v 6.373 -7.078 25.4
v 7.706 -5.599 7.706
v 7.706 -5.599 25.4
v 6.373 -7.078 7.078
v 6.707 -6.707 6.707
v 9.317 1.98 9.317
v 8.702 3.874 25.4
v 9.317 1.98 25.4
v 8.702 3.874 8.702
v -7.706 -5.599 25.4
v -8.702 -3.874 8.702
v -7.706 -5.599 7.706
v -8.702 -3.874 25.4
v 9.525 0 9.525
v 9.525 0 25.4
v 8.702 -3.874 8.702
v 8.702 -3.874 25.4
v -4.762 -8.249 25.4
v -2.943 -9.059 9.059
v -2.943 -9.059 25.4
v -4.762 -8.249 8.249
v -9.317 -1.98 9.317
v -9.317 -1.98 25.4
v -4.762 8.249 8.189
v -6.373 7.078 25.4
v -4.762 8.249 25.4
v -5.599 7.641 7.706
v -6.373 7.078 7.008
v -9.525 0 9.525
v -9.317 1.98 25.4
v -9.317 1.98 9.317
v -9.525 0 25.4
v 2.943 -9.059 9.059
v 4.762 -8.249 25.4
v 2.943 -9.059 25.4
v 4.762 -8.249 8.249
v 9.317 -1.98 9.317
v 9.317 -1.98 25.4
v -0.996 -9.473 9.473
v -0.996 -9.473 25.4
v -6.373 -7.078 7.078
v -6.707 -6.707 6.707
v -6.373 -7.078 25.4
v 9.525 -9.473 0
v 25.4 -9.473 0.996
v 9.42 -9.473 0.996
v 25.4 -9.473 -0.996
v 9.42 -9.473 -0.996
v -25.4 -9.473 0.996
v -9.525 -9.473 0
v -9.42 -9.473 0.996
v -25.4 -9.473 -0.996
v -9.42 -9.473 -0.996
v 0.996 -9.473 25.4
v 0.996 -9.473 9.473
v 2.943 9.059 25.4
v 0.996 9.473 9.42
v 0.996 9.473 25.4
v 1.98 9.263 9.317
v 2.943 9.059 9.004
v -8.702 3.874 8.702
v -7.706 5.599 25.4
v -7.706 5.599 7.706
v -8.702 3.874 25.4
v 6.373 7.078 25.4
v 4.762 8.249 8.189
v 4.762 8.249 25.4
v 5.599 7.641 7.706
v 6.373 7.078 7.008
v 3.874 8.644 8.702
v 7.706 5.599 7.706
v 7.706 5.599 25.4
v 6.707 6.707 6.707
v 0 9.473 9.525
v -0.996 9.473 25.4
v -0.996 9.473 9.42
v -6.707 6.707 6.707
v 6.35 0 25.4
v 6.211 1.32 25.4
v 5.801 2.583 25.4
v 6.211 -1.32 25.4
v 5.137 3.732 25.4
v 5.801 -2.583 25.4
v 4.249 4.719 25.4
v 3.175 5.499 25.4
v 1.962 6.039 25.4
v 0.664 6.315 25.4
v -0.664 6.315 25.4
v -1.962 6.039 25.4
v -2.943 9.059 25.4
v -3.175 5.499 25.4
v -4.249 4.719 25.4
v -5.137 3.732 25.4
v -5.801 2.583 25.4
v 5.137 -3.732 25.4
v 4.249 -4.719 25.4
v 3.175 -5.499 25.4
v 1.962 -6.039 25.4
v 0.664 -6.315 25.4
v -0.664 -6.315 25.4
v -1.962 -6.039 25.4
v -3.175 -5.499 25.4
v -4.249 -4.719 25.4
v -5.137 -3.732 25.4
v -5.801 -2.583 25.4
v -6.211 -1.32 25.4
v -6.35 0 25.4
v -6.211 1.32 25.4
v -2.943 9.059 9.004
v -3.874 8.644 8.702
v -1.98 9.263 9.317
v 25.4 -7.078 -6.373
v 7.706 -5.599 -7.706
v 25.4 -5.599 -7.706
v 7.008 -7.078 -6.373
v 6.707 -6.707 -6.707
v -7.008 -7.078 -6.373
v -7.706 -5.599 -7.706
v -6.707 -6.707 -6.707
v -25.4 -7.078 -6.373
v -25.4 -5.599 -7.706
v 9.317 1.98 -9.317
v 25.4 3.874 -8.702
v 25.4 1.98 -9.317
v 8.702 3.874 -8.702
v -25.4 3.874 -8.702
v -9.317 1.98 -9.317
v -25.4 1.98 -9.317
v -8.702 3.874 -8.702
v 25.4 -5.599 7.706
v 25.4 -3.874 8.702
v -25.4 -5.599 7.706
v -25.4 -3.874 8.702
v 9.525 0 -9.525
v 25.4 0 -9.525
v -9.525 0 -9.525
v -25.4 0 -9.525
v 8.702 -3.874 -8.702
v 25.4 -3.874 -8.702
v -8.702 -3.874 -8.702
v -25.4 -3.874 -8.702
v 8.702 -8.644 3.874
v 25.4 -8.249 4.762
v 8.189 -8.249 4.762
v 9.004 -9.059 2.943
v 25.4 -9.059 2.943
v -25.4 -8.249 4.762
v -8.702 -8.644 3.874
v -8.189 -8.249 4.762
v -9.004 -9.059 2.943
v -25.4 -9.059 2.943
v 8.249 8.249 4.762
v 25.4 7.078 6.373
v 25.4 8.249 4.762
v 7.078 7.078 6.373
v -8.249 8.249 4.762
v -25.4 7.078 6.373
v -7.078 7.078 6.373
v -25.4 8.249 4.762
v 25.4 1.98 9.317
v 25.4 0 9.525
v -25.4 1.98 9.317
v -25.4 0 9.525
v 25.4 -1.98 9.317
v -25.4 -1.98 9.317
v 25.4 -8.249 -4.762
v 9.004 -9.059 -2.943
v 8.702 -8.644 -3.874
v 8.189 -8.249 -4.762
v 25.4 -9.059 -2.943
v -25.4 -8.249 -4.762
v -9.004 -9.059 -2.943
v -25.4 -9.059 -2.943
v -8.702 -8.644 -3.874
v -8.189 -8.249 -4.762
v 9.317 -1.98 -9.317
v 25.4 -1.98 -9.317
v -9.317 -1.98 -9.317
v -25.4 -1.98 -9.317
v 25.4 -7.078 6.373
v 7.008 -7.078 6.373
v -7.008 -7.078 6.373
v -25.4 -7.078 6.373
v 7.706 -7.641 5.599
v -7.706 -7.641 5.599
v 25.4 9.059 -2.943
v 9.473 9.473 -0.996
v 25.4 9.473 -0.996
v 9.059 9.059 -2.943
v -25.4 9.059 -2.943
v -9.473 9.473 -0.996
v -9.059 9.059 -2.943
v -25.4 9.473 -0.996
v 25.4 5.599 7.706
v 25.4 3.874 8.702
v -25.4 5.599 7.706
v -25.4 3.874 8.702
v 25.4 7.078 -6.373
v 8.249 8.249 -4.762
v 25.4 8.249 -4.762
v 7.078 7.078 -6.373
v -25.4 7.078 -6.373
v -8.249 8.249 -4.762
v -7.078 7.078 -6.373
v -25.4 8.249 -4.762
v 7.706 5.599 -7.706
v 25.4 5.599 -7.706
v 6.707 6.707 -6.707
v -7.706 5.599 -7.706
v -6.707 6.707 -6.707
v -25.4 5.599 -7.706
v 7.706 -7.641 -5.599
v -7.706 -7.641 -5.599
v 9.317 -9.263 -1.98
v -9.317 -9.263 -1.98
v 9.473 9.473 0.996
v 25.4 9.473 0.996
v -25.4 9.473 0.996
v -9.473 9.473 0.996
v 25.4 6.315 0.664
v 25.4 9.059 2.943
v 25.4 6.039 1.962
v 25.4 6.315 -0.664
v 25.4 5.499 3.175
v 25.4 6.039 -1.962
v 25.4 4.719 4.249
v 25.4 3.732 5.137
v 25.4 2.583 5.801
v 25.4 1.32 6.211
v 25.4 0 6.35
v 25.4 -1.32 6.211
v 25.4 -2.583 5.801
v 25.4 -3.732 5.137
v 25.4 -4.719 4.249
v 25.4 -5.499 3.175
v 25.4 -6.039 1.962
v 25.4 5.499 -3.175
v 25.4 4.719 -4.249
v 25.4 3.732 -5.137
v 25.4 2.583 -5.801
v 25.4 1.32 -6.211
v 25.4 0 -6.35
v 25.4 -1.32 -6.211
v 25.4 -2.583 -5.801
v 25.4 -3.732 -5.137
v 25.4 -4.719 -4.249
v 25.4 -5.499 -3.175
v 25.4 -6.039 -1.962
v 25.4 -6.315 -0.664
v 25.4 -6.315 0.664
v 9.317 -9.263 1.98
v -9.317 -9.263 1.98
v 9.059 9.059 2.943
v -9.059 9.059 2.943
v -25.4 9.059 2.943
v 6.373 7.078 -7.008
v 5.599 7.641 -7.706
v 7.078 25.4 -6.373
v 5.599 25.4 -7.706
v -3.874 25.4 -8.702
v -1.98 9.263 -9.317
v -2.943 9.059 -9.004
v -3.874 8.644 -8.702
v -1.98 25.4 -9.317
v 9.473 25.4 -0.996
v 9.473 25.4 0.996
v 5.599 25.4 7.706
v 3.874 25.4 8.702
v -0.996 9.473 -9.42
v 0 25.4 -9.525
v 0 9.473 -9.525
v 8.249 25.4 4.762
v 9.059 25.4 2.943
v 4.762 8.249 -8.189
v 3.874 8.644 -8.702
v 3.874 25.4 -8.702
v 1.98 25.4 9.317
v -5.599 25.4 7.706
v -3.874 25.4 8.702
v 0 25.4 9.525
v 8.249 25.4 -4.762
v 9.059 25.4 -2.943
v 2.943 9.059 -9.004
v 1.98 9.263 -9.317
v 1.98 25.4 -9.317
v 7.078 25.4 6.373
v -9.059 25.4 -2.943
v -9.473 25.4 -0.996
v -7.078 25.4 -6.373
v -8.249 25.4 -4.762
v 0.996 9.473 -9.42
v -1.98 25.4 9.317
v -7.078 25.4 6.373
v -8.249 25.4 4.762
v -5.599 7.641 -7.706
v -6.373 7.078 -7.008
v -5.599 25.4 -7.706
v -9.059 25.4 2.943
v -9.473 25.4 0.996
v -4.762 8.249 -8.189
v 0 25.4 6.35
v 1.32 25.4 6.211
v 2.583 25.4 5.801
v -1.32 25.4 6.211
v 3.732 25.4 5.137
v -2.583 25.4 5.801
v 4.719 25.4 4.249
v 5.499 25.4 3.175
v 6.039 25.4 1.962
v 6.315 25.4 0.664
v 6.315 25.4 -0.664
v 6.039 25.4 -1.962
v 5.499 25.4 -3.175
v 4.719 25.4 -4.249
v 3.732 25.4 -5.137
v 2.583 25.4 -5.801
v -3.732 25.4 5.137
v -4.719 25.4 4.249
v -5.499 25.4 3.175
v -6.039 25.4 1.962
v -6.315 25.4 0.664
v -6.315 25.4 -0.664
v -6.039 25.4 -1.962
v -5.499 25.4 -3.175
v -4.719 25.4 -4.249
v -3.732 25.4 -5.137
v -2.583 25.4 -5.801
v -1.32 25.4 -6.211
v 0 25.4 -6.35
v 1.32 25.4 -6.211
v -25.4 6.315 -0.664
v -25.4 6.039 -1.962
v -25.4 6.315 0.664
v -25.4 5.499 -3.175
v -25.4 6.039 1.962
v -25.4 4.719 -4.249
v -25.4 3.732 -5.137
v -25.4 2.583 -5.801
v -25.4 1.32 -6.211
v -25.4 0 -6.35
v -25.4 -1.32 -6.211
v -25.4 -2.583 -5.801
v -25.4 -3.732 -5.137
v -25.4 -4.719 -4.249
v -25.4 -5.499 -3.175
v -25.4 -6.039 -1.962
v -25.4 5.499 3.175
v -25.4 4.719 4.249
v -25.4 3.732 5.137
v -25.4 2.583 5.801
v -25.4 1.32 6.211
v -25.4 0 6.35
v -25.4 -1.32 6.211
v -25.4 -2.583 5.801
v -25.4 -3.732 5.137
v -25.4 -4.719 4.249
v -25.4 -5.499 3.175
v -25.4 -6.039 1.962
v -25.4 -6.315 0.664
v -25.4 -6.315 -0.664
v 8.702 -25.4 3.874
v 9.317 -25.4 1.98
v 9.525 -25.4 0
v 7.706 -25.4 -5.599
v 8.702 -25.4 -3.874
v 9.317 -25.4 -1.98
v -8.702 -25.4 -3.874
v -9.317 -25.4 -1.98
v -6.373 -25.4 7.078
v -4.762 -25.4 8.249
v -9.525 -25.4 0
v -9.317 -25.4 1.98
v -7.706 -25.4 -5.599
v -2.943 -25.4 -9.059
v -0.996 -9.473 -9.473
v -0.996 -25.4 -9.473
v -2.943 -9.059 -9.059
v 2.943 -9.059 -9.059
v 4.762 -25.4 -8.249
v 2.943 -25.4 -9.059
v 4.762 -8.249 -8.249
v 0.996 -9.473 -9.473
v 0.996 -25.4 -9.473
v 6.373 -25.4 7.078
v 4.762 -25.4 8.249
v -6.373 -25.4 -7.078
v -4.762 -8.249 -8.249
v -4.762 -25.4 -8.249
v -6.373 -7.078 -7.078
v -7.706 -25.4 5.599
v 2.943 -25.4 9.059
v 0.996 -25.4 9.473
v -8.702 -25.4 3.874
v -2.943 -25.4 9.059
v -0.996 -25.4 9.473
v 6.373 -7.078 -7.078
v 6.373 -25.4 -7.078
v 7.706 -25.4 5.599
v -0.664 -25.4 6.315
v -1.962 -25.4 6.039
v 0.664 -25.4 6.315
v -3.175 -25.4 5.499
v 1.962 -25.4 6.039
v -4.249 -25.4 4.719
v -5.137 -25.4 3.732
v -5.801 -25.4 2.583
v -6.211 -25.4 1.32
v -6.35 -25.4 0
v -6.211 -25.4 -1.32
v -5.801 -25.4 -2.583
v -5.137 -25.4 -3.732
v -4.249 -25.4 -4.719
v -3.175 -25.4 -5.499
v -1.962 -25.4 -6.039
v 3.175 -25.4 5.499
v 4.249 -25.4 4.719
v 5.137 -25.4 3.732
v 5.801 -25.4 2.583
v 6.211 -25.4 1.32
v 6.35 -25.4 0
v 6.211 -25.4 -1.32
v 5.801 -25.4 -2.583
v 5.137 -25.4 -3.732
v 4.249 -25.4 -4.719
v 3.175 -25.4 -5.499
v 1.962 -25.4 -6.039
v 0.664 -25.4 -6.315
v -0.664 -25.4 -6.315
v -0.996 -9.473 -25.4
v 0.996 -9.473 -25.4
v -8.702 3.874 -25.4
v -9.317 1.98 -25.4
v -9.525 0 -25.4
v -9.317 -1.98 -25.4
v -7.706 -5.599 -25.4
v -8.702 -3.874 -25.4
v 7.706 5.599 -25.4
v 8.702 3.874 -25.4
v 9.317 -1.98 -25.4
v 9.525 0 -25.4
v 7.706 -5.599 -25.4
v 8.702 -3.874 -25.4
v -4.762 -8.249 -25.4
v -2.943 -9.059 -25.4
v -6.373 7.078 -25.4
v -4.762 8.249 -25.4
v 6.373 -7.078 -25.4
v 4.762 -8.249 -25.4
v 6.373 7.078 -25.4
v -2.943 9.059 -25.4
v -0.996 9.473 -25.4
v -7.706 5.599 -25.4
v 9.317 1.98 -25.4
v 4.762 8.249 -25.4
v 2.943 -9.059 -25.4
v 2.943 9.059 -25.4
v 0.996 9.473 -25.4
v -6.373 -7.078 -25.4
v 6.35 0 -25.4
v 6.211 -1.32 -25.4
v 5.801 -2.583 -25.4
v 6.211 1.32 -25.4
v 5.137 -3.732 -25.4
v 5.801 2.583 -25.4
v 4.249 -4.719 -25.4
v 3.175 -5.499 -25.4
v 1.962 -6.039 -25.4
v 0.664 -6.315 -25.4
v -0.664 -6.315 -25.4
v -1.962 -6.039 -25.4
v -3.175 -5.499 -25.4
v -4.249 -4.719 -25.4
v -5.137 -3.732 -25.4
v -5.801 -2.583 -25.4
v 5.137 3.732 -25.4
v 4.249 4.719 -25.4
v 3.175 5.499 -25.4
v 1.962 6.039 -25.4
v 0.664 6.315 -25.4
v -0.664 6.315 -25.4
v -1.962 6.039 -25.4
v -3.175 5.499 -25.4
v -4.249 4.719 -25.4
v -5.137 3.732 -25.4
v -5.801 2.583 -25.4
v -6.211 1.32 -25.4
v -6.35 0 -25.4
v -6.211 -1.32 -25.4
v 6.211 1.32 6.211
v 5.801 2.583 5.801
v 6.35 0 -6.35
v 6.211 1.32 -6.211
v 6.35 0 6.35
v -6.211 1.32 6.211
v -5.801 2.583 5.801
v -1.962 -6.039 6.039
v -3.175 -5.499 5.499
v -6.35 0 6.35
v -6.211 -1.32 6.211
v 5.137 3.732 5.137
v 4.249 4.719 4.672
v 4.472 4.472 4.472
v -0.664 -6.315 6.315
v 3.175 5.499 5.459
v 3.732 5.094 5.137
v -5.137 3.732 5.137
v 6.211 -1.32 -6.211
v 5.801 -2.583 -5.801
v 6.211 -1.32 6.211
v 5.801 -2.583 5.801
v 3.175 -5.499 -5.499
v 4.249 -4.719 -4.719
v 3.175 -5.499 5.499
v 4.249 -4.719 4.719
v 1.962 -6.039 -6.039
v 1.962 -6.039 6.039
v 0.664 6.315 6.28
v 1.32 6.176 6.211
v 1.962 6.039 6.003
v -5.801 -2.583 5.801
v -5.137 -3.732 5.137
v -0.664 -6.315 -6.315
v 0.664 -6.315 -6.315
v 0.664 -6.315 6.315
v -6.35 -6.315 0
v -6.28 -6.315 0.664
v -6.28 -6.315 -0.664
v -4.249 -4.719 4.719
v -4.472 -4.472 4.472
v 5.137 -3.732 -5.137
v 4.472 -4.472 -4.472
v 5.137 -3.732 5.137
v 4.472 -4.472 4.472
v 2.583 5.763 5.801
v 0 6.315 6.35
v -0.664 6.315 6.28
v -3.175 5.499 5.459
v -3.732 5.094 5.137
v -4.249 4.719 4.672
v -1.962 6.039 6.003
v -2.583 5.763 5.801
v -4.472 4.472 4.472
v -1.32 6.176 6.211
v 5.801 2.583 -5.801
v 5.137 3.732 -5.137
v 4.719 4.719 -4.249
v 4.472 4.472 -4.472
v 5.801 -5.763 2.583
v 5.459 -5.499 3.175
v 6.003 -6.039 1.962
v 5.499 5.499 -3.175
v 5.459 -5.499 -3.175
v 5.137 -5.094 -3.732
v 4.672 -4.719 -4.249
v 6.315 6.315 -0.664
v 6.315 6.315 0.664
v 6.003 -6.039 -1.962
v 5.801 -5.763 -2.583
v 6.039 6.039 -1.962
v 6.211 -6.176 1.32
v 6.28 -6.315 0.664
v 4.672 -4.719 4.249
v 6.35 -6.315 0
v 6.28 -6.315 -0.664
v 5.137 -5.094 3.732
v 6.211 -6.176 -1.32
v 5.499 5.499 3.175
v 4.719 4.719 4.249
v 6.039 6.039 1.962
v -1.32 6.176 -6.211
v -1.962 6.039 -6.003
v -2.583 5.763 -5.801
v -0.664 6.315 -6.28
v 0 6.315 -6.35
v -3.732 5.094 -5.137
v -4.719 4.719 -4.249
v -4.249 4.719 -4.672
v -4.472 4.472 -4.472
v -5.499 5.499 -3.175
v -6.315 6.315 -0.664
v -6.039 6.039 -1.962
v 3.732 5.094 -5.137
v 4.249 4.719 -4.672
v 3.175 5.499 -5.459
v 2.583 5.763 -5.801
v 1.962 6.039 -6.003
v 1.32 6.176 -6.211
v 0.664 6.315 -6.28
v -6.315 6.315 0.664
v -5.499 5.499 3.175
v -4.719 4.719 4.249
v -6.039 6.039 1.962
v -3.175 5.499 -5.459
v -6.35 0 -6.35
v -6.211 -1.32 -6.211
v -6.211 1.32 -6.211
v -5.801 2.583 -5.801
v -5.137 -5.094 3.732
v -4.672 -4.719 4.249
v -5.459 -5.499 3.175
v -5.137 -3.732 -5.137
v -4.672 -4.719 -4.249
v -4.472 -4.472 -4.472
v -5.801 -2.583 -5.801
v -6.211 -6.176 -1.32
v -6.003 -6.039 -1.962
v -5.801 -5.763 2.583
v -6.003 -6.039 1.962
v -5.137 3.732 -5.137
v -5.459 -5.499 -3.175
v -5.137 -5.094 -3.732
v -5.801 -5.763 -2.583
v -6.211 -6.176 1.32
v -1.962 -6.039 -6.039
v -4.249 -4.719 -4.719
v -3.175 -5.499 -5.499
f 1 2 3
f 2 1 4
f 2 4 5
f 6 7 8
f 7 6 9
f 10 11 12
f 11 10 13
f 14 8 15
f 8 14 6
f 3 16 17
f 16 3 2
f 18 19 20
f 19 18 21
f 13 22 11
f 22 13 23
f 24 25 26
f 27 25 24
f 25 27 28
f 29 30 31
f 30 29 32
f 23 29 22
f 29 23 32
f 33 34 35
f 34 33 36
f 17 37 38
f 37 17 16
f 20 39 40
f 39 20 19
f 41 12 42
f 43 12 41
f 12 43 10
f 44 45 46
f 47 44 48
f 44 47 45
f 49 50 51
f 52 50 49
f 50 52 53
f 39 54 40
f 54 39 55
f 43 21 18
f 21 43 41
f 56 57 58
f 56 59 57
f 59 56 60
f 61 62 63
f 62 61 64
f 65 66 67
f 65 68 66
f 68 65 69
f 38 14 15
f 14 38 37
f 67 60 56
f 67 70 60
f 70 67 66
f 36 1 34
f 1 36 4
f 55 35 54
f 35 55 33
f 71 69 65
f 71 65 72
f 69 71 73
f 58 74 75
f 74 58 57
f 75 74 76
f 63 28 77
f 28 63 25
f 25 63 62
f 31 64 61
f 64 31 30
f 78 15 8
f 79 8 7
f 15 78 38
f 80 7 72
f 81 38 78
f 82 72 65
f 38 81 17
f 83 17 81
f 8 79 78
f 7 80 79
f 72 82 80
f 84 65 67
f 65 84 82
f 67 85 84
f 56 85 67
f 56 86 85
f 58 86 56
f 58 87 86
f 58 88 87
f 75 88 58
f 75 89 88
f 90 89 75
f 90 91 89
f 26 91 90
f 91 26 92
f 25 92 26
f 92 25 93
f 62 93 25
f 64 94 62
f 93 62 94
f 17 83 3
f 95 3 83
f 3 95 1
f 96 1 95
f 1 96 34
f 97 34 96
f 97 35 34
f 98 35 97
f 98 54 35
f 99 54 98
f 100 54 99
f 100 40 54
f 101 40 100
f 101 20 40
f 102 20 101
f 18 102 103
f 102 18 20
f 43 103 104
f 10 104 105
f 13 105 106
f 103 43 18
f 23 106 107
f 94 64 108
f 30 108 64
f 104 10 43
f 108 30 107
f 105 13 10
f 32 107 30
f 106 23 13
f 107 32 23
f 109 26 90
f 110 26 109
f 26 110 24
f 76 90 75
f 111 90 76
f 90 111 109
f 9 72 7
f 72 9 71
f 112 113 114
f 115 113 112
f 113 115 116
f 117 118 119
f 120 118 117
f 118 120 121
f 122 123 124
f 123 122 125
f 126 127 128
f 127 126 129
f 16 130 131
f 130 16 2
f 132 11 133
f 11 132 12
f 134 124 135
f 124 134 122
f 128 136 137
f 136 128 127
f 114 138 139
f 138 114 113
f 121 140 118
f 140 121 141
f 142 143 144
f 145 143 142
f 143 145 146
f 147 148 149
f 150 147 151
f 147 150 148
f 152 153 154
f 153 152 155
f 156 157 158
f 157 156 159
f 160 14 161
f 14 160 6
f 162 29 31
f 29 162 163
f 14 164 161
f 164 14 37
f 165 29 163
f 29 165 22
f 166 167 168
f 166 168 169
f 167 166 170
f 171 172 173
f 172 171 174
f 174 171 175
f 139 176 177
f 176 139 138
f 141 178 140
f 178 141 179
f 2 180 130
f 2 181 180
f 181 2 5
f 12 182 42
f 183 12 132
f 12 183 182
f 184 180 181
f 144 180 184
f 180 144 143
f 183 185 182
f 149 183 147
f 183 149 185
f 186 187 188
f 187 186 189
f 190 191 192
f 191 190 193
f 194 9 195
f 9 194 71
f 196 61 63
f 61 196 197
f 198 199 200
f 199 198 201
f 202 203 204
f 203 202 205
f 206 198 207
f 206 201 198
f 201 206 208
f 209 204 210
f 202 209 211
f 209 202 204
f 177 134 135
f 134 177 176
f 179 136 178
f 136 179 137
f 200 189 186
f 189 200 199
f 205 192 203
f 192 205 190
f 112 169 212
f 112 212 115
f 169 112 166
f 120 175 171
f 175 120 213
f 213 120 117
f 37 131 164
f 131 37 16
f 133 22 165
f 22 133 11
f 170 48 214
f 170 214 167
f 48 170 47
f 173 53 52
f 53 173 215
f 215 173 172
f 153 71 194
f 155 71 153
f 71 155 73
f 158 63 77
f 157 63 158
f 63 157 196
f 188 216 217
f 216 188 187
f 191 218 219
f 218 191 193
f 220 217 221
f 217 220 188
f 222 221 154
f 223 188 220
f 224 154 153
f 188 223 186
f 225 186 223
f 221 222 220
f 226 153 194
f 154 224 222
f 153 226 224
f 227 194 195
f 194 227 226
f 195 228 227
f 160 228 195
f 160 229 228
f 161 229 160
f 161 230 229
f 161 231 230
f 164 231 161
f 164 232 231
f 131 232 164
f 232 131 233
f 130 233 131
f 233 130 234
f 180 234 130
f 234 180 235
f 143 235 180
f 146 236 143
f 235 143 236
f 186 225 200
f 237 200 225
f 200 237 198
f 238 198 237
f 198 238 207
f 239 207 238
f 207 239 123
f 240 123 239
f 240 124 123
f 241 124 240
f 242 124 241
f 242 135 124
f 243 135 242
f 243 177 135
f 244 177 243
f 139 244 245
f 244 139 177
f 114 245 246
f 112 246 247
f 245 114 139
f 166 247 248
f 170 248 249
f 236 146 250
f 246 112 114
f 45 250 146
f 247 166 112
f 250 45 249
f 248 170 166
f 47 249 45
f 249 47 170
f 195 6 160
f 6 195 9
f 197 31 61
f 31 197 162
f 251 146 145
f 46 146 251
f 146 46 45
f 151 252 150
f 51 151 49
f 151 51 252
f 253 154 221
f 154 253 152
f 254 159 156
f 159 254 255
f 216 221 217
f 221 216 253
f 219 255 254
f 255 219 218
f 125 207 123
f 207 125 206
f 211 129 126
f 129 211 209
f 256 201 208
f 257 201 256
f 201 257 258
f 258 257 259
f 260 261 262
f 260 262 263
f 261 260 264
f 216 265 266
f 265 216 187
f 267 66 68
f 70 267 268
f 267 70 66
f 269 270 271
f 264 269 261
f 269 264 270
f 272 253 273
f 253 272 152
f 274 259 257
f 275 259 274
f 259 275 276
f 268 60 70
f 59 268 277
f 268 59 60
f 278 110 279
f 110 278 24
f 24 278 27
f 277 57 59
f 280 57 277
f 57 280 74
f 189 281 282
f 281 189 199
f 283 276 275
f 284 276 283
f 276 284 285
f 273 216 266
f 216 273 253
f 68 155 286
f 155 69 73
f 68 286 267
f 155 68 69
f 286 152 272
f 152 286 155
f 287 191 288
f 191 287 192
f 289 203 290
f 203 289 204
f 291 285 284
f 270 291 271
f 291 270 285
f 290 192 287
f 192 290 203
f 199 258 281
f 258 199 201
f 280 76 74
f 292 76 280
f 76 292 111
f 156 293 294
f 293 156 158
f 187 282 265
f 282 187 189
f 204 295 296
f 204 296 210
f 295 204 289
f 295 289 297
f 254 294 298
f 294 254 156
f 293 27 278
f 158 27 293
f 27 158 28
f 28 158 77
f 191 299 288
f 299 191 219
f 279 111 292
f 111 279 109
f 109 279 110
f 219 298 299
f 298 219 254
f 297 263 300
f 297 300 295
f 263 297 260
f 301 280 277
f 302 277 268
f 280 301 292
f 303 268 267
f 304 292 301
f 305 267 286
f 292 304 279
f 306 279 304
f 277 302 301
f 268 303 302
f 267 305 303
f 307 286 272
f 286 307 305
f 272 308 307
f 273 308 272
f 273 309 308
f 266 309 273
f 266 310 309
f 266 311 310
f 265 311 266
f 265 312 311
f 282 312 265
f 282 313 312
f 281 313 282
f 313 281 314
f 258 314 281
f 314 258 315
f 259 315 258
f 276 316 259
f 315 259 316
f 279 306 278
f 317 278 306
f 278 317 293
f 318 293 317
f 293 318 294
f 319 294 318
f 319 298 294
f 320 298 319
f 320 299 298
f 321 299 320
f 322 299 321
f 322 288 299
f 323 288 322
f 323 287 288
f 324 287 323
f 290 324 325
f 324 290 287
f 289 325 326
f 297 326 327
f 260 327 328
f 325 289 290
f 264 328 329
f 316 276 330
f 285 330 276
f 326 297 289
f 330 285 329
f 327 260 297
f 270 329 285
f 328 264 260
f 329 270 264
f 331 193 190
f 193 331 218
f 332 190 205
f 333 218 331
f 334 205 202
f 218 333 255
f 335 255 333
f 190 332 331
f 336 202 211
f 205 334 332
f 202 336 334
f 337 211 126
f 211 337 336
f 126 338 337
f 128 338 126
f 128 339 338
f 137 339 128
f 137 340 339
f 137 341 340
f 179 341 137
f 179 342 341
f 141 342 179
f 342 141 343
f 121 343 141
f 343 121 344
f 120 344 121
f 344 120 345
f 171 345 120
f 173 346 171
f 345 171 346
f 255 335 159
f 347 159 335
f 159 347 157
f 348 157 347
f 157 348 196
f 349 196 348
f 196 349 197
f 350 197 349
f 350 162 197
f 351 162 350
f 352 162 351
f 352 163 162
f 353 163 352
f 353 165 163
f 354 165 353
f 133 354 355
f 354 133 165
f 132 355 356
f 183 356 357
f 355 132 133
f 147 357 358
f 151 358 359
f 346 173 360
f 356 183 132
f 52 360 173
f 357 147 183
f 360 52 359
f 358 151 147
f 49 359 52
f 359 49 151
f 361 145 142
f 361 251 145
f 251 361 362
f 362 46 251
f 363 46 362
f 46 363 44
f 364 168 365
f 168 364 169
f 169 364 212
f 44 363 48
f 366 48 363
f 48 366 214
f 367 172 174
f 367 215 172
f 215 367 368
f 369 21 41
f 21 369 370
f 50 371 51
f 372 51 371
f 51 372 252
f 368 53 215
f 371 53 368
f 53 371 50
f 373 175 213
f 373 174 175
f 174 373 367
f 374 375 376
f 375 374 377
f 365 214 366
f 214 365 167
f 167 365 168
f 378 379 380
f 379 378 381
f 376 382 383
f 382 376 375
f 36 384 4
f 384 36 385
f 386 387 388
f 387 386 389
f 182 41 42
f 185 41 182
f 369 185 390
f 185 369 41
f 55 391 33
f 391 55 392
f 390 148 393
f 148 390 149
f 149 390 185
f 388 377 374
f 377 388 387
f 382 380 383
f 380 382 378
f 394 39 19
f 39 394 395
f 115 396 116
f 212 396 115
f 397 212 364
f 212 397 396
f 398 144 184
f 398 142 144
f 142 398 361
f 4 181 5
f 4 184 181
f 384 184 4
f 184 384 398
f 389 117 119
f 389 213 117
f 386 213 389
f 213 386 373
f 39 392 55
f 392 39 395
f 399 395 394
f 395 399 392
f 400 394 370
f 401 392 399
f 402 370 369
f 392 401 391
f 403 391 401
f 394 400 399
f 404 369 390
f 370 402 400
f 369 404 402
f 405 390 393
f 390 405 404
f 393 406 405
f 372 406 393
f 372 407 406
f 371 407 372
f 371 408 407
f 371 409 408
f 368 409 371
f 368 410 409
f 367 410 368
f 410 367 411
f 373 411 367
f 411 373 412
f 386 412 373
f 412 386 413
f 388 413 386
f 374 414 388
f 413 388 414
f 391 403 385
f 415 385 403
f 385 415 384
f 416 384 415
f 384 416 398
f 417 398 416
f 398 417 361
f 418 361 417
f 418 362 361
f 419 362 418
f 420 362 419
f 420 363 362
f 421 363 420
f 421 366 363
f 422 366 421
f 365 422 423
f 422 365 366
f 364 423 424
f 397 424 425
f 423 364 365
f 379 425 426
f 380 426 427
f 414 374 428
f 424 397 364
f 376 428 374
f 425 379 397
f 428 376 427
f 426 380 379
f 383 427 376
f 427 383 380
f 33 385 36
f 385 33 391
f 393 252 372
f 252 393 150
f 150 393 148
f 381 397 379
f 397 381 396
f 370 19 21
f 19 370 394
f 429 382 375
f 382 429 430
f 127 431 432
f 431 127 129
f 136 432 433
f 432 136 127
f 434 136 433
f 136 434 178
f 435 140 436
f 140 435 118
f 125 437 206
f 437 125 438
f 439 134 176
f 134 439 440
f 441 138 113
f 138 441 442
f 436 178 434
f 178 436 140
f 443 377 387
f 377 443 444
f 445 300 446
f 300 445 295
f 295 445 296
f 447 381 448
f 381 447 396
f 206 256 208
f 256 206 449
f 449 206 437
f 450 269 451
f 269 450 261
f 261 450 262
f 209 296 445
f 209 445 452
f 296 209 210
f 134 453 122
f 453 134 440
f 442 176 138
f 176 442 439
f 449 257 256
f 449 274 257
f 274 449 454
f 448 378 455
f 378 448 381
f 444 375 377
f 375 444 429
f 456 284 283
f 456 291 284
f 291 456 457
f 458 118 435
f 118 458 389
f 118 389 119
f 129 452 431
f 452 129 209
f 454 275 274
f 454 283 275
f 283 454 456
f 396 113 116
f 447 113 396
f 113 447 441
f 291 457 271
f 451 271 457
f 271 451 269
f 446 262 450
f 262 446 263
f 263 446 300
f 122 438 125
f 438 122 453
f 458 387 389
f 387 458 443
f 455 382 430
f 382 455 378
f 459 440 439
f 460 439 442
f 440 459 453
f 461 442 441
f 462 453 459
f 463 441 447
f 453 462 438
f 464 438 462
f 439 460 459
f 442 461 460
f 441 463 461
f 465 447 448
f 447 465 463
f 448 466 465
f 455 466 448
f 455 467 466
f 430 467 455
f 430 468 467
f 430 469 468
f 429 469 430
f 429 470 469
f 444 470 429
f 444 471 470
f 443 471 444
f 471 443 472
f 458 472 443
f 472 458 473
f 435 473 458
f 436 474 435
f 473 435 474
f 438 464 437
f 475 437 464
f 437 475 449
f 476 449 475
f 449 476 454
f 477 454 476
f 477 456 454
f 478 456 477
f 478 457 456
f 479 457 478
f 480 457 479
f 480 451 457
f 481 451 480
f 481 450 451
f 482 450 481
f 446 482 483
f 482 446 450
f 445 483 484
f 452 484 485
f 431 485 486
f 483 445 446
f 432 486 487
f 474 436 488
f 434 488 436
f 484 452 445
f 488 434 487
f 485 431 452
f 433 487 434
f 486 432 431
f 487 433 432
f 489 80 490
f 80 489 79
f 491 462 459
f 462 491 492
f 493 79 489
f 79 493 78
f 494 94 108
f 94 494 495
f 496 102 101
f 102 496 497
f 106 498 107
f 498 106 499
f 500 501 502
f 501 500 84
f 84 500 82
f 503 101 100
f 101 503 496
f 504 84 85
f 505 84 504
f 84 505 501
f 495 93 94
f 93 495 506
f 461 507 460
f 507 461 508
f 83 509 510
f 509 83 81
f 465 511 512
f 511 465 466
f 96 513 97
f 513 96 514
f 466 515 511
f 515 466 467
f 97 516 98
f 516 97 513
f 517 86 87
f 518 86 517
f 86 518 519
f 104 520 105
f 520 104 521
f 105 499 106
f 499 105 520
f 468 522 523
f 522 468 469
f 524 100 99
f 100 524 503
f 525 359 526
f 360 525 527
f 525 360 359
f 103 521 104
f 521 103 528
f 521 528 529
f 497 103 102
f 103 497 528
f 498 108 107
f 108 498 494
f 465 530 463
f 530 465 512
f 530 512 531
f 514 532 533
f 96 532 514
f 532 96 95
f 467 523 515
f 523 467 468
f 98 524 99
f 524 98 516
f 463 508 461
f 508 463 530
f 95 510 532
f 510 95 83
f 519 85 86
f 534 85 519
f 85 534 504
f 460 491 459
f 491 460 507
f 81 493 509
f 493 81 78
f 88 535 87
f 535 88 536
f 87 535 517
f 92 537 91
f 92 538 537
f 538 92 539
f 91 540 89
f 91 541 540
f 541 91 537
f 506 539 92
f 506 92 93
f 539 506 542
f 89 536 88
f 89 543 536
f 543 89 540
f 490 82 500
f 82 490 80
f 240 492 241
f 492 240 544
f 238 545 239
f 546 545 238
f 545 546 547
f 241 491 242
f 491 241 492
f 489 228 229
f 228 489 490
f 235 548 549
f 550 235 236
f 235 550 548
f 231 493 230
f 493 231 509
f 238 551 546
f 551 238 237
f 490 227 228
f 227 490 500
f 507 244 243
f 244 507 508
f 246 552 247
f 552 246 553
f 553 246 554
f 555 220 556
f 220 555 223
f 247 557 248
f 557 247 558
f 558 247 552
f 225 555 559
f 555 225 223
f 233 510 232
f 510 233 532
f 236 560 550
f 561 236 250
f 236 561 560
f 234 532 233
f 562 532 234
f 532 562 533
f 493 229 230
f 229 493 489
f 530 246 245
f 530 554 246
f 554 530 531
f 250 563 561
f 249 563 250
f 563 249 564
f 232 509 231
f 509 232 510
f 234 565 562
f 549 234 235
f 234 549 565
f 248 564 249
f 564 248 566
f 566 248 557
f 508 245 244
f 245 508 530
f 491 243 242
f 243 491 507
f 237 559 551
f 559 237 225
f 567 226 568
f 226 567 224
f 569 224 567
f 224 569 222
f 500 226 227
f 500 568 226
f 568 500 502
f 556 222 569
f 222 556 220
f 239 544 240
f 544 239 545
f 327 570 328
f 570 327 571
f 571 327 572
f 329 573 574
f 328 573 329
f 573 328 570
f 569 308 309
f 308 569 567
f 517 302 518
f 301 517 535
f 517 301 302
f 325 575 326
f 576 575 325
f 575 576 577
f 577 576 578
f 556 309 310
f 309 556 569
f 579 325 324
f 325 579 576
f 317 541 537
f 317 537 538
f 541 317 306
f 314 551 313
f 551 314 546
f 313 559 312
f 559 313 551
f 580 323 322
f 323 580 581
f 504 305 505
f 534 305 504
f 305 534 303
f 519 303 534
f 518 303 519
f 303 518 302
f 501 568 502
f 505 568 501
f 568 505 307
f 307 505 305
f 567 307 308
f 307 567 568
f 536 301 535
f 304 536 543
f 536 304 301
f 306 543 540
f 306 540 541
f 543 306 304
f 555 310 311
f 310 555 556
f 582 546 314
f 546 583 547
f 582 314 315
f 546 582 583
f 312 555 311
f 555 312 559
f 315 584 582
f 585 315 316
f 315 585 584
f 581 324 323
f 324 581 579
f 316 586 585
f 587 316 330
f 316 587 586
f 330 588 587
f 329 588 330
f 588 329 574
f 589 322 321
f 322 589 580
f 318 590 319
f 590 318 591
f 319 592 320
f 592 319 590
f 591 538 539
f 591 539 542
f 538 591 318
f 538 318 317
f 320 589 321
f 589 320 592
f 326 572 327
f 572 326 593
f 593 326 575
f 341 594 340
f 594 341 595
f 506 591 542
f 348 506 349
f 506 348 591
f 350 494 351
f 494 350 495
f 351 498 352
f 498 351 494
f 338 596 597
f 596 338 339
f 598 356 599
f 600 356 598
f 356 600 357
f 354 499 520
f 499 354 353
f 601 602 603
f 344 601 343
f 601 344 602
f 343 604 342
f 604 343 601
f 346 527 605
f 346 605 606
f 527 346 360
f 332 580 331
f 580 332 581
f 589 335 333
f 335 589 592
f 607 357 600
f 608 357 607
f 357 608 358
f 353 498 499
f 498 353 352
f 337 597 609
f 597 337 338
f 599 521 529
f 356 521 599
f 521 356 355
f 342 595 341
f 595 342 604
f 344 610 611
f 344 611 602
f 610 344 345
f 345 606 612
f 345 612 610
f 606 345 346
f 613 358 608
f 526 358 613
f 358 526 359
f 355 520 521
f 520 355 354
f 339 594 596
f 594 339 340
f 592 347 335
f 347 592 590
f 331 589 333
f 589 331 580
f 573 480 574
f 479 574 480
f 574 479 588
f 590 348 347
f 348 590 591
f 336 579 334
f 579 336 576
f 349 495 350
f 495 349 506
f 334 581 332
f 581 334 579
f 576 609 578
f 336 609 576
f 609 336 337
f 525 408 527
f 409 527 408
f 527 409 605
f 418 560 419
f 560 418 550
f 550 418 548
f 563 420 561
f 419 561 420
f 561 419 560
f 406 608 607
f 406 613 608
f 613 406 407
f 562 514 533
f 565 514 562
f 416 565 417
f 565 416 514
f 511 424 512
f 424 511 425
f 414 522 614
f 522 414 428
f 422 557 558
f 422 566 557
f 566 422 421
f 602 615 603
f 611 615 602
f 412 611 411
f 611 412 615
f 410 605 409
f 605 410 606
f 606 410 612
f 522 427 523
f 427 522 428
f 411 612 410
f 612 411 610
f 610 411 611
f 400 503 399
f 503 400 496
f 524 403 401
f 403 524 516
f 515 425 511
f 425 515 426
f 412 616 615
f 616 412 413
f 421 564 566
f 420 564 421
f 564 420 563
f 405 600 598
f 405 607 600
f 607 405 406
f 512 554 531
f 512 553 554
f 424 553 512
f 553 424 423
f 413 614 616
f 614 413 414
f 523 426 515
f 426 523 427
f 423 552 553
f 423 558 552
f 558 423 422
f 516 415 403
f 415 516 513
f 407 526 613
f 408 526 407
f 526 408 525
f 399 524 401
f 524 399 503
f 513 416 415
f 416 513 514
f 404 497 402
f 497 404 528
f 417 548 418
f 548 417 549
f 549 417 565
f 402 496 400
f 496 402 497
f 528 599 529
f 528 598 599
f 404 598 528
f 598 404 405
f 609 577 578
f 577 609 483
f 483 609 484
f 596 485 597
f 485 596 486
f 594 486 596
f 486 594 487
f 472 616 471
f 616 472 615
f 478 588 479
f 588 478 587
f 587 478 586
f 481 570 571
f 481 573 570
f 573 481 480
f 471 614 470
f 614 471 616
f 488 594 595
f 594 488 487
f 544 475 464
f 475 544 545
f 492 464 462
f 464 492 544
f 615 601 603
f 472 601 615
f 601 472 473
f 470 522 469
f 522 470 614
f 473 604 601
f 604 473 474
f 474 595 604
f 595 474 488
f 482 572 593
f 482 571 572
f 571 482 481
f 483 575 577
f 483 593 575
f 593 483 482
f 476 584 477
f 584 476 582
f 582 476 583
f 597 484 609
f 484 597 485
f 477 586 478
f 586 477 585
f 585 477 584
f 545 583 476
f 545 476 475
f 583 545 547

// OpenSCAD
//for kites :)
/*[Universal Features]*/
outter_diameter = .375;
//aka what is the skiniest you will want this to be regardless of what you enter.
minimum_shell = .0625;
minimum_length = 1;
/*[units]*/
//Basically are you using american units or real units
units_entered = 25.4;//[1:mm, 10:cm, 1000:meter, 25.4:inch, 304.8:foot]
//default is mm for most printers
desired_units_for_output = 1;//[1:mm, .1:cm, 0.001:meter, 0.0393701:inch, 0.00328084:foot]

/*[arm 1]*/
arm_1_length = 1;
arm_1_inner_diameter = 0.25;
//x,y,z
arm_1_angle = [0,0,0];
//color in rgb values
arm_1_color = [1,0,0];
/*[arm 2]*/
arm_2_length = 1;
arm_2_inner_diameter = 0.25;
//x,y,z
arm_2_angle = [0,90,0];
//color in rgb values
arm_2_color = [0,1,0];
/*[arm 3]*/
arm_3_length = 1;
arm_3_inner_diameter = 0.25;
//x,y,z
arm_3_angle = [0,90,90];
//color in rgb values
arm_3_color = [0,0,1];
/*[arm 4]*/
arm_4_length = 1;
arm_4_inner_diameter = 0.25;
//x,y,z
arm_4_angle = [0,-90,0];
//color in rgb values
arm_4_color = [1,1,0];
/*[arm 5]*/
arm_5_length = 1;
arm_5_inner_diameter = 0.25;
//x,y,z
arm_5_angle = [90,0,0];
//color in rgb values
arm_5_color = [1,0,1];
/*[arm 6]*/
arm_6_length = 1;
arm_6_inner_diameter = 0.25;
//x,y,z
arm_6_angle = [0,180,0];
//color in rgb values
arm_6_color = [0,1,1];
/*[arm 7]*/
arm_7_length = 0;
arm_7_inner_diameter = 0.25;
//x,y,z
arm_7_angle = [0,0,0];
//color in rgb values
arm_7_color = [1,1,1];
/*[arm 8]*/
arm_8_length = 0;
arm_8_inner_diameter = 0.25;
//x,y,z
arm_8_angle = [0,0,0];
//color in rgb values
arm_8_color = [.5,.5,0];
/*[arm 9]*/
arm_9_length = 0;
arm_9_inner_diameter = 0.25;
//x,y,z
arm_9_angle = [0,0,0];
//color in rgb values
arm_9_color = [0,.5,.5];
/*[arm 10]*/
arm_10_length = 0;
arm_10_inner_diameter = 0.25;
//x,y,z
arm_10_angle = [0,0,0];
//color in rgb values
arm_10_color = [.5,0,.5];

array_to_reference = 
[[arm_1_length,arm_1_inner_diameter,arm_1_angle,arm_1_color],[arm_2_length,arm_2_inner_diameter,arm_2_angle,arm_2_color],[arm_3_length,arm_3_inner_diameter,arm_3_angle,arm_3_color],[arm_4_length,arm_4_inner_diameter,arm_4_angle,arm_4_color],[arm_5_length,arm_5_inner_diameter,arm_5_angle,arm_5_color],[arm_6_length,arm_6_inner_diameter,arm_6_angle,arm_6_color],[arm_7_length,arm_7_inner_diameter,arm_7_angle,arm_7_color],[arm_8_length,arm_8_inner_diameter,arm_8_angle,arm_8_color],[arm_9_length,arm_9_inner_diameter,arm_9_angle,arm_9_color],[arm_10_length,arm_10_inner_diameter,arm_10_angle,arm_10_color]];
unit_conversion_factor = units_entered*desired_units_for_output;

scale(unit_conversion_factor){
	difference(){
		union(){
			sphere(outter_diameter,$fs=.05);
			for(current_arm = [0:9]){
				rotate(array_to_reference[current_arm][2]){
					difference(){
						if(true){
							color(array_to_reference[current_arm][3]){
								linear_extrude(array_to_reference[current_arm][0]){
									circle(outter_diameter,$fs = .05);
								}
							}
						}
					}
				}
			}
		}
		union(){
			for(current_arm = [0:9]){
				rotate(array_to_reference[current_arm][2]){
					translate([0,0,-.01]){
						color(array_to_reference[current_arm][3]*.9){
							linear_extrude(array_to_reference[current_arm][0]+.02){
								circle(array_to_reference[current_arm][1],$fs = .025);
							}	
						}
					}
				}
			}
		}
	}
}

